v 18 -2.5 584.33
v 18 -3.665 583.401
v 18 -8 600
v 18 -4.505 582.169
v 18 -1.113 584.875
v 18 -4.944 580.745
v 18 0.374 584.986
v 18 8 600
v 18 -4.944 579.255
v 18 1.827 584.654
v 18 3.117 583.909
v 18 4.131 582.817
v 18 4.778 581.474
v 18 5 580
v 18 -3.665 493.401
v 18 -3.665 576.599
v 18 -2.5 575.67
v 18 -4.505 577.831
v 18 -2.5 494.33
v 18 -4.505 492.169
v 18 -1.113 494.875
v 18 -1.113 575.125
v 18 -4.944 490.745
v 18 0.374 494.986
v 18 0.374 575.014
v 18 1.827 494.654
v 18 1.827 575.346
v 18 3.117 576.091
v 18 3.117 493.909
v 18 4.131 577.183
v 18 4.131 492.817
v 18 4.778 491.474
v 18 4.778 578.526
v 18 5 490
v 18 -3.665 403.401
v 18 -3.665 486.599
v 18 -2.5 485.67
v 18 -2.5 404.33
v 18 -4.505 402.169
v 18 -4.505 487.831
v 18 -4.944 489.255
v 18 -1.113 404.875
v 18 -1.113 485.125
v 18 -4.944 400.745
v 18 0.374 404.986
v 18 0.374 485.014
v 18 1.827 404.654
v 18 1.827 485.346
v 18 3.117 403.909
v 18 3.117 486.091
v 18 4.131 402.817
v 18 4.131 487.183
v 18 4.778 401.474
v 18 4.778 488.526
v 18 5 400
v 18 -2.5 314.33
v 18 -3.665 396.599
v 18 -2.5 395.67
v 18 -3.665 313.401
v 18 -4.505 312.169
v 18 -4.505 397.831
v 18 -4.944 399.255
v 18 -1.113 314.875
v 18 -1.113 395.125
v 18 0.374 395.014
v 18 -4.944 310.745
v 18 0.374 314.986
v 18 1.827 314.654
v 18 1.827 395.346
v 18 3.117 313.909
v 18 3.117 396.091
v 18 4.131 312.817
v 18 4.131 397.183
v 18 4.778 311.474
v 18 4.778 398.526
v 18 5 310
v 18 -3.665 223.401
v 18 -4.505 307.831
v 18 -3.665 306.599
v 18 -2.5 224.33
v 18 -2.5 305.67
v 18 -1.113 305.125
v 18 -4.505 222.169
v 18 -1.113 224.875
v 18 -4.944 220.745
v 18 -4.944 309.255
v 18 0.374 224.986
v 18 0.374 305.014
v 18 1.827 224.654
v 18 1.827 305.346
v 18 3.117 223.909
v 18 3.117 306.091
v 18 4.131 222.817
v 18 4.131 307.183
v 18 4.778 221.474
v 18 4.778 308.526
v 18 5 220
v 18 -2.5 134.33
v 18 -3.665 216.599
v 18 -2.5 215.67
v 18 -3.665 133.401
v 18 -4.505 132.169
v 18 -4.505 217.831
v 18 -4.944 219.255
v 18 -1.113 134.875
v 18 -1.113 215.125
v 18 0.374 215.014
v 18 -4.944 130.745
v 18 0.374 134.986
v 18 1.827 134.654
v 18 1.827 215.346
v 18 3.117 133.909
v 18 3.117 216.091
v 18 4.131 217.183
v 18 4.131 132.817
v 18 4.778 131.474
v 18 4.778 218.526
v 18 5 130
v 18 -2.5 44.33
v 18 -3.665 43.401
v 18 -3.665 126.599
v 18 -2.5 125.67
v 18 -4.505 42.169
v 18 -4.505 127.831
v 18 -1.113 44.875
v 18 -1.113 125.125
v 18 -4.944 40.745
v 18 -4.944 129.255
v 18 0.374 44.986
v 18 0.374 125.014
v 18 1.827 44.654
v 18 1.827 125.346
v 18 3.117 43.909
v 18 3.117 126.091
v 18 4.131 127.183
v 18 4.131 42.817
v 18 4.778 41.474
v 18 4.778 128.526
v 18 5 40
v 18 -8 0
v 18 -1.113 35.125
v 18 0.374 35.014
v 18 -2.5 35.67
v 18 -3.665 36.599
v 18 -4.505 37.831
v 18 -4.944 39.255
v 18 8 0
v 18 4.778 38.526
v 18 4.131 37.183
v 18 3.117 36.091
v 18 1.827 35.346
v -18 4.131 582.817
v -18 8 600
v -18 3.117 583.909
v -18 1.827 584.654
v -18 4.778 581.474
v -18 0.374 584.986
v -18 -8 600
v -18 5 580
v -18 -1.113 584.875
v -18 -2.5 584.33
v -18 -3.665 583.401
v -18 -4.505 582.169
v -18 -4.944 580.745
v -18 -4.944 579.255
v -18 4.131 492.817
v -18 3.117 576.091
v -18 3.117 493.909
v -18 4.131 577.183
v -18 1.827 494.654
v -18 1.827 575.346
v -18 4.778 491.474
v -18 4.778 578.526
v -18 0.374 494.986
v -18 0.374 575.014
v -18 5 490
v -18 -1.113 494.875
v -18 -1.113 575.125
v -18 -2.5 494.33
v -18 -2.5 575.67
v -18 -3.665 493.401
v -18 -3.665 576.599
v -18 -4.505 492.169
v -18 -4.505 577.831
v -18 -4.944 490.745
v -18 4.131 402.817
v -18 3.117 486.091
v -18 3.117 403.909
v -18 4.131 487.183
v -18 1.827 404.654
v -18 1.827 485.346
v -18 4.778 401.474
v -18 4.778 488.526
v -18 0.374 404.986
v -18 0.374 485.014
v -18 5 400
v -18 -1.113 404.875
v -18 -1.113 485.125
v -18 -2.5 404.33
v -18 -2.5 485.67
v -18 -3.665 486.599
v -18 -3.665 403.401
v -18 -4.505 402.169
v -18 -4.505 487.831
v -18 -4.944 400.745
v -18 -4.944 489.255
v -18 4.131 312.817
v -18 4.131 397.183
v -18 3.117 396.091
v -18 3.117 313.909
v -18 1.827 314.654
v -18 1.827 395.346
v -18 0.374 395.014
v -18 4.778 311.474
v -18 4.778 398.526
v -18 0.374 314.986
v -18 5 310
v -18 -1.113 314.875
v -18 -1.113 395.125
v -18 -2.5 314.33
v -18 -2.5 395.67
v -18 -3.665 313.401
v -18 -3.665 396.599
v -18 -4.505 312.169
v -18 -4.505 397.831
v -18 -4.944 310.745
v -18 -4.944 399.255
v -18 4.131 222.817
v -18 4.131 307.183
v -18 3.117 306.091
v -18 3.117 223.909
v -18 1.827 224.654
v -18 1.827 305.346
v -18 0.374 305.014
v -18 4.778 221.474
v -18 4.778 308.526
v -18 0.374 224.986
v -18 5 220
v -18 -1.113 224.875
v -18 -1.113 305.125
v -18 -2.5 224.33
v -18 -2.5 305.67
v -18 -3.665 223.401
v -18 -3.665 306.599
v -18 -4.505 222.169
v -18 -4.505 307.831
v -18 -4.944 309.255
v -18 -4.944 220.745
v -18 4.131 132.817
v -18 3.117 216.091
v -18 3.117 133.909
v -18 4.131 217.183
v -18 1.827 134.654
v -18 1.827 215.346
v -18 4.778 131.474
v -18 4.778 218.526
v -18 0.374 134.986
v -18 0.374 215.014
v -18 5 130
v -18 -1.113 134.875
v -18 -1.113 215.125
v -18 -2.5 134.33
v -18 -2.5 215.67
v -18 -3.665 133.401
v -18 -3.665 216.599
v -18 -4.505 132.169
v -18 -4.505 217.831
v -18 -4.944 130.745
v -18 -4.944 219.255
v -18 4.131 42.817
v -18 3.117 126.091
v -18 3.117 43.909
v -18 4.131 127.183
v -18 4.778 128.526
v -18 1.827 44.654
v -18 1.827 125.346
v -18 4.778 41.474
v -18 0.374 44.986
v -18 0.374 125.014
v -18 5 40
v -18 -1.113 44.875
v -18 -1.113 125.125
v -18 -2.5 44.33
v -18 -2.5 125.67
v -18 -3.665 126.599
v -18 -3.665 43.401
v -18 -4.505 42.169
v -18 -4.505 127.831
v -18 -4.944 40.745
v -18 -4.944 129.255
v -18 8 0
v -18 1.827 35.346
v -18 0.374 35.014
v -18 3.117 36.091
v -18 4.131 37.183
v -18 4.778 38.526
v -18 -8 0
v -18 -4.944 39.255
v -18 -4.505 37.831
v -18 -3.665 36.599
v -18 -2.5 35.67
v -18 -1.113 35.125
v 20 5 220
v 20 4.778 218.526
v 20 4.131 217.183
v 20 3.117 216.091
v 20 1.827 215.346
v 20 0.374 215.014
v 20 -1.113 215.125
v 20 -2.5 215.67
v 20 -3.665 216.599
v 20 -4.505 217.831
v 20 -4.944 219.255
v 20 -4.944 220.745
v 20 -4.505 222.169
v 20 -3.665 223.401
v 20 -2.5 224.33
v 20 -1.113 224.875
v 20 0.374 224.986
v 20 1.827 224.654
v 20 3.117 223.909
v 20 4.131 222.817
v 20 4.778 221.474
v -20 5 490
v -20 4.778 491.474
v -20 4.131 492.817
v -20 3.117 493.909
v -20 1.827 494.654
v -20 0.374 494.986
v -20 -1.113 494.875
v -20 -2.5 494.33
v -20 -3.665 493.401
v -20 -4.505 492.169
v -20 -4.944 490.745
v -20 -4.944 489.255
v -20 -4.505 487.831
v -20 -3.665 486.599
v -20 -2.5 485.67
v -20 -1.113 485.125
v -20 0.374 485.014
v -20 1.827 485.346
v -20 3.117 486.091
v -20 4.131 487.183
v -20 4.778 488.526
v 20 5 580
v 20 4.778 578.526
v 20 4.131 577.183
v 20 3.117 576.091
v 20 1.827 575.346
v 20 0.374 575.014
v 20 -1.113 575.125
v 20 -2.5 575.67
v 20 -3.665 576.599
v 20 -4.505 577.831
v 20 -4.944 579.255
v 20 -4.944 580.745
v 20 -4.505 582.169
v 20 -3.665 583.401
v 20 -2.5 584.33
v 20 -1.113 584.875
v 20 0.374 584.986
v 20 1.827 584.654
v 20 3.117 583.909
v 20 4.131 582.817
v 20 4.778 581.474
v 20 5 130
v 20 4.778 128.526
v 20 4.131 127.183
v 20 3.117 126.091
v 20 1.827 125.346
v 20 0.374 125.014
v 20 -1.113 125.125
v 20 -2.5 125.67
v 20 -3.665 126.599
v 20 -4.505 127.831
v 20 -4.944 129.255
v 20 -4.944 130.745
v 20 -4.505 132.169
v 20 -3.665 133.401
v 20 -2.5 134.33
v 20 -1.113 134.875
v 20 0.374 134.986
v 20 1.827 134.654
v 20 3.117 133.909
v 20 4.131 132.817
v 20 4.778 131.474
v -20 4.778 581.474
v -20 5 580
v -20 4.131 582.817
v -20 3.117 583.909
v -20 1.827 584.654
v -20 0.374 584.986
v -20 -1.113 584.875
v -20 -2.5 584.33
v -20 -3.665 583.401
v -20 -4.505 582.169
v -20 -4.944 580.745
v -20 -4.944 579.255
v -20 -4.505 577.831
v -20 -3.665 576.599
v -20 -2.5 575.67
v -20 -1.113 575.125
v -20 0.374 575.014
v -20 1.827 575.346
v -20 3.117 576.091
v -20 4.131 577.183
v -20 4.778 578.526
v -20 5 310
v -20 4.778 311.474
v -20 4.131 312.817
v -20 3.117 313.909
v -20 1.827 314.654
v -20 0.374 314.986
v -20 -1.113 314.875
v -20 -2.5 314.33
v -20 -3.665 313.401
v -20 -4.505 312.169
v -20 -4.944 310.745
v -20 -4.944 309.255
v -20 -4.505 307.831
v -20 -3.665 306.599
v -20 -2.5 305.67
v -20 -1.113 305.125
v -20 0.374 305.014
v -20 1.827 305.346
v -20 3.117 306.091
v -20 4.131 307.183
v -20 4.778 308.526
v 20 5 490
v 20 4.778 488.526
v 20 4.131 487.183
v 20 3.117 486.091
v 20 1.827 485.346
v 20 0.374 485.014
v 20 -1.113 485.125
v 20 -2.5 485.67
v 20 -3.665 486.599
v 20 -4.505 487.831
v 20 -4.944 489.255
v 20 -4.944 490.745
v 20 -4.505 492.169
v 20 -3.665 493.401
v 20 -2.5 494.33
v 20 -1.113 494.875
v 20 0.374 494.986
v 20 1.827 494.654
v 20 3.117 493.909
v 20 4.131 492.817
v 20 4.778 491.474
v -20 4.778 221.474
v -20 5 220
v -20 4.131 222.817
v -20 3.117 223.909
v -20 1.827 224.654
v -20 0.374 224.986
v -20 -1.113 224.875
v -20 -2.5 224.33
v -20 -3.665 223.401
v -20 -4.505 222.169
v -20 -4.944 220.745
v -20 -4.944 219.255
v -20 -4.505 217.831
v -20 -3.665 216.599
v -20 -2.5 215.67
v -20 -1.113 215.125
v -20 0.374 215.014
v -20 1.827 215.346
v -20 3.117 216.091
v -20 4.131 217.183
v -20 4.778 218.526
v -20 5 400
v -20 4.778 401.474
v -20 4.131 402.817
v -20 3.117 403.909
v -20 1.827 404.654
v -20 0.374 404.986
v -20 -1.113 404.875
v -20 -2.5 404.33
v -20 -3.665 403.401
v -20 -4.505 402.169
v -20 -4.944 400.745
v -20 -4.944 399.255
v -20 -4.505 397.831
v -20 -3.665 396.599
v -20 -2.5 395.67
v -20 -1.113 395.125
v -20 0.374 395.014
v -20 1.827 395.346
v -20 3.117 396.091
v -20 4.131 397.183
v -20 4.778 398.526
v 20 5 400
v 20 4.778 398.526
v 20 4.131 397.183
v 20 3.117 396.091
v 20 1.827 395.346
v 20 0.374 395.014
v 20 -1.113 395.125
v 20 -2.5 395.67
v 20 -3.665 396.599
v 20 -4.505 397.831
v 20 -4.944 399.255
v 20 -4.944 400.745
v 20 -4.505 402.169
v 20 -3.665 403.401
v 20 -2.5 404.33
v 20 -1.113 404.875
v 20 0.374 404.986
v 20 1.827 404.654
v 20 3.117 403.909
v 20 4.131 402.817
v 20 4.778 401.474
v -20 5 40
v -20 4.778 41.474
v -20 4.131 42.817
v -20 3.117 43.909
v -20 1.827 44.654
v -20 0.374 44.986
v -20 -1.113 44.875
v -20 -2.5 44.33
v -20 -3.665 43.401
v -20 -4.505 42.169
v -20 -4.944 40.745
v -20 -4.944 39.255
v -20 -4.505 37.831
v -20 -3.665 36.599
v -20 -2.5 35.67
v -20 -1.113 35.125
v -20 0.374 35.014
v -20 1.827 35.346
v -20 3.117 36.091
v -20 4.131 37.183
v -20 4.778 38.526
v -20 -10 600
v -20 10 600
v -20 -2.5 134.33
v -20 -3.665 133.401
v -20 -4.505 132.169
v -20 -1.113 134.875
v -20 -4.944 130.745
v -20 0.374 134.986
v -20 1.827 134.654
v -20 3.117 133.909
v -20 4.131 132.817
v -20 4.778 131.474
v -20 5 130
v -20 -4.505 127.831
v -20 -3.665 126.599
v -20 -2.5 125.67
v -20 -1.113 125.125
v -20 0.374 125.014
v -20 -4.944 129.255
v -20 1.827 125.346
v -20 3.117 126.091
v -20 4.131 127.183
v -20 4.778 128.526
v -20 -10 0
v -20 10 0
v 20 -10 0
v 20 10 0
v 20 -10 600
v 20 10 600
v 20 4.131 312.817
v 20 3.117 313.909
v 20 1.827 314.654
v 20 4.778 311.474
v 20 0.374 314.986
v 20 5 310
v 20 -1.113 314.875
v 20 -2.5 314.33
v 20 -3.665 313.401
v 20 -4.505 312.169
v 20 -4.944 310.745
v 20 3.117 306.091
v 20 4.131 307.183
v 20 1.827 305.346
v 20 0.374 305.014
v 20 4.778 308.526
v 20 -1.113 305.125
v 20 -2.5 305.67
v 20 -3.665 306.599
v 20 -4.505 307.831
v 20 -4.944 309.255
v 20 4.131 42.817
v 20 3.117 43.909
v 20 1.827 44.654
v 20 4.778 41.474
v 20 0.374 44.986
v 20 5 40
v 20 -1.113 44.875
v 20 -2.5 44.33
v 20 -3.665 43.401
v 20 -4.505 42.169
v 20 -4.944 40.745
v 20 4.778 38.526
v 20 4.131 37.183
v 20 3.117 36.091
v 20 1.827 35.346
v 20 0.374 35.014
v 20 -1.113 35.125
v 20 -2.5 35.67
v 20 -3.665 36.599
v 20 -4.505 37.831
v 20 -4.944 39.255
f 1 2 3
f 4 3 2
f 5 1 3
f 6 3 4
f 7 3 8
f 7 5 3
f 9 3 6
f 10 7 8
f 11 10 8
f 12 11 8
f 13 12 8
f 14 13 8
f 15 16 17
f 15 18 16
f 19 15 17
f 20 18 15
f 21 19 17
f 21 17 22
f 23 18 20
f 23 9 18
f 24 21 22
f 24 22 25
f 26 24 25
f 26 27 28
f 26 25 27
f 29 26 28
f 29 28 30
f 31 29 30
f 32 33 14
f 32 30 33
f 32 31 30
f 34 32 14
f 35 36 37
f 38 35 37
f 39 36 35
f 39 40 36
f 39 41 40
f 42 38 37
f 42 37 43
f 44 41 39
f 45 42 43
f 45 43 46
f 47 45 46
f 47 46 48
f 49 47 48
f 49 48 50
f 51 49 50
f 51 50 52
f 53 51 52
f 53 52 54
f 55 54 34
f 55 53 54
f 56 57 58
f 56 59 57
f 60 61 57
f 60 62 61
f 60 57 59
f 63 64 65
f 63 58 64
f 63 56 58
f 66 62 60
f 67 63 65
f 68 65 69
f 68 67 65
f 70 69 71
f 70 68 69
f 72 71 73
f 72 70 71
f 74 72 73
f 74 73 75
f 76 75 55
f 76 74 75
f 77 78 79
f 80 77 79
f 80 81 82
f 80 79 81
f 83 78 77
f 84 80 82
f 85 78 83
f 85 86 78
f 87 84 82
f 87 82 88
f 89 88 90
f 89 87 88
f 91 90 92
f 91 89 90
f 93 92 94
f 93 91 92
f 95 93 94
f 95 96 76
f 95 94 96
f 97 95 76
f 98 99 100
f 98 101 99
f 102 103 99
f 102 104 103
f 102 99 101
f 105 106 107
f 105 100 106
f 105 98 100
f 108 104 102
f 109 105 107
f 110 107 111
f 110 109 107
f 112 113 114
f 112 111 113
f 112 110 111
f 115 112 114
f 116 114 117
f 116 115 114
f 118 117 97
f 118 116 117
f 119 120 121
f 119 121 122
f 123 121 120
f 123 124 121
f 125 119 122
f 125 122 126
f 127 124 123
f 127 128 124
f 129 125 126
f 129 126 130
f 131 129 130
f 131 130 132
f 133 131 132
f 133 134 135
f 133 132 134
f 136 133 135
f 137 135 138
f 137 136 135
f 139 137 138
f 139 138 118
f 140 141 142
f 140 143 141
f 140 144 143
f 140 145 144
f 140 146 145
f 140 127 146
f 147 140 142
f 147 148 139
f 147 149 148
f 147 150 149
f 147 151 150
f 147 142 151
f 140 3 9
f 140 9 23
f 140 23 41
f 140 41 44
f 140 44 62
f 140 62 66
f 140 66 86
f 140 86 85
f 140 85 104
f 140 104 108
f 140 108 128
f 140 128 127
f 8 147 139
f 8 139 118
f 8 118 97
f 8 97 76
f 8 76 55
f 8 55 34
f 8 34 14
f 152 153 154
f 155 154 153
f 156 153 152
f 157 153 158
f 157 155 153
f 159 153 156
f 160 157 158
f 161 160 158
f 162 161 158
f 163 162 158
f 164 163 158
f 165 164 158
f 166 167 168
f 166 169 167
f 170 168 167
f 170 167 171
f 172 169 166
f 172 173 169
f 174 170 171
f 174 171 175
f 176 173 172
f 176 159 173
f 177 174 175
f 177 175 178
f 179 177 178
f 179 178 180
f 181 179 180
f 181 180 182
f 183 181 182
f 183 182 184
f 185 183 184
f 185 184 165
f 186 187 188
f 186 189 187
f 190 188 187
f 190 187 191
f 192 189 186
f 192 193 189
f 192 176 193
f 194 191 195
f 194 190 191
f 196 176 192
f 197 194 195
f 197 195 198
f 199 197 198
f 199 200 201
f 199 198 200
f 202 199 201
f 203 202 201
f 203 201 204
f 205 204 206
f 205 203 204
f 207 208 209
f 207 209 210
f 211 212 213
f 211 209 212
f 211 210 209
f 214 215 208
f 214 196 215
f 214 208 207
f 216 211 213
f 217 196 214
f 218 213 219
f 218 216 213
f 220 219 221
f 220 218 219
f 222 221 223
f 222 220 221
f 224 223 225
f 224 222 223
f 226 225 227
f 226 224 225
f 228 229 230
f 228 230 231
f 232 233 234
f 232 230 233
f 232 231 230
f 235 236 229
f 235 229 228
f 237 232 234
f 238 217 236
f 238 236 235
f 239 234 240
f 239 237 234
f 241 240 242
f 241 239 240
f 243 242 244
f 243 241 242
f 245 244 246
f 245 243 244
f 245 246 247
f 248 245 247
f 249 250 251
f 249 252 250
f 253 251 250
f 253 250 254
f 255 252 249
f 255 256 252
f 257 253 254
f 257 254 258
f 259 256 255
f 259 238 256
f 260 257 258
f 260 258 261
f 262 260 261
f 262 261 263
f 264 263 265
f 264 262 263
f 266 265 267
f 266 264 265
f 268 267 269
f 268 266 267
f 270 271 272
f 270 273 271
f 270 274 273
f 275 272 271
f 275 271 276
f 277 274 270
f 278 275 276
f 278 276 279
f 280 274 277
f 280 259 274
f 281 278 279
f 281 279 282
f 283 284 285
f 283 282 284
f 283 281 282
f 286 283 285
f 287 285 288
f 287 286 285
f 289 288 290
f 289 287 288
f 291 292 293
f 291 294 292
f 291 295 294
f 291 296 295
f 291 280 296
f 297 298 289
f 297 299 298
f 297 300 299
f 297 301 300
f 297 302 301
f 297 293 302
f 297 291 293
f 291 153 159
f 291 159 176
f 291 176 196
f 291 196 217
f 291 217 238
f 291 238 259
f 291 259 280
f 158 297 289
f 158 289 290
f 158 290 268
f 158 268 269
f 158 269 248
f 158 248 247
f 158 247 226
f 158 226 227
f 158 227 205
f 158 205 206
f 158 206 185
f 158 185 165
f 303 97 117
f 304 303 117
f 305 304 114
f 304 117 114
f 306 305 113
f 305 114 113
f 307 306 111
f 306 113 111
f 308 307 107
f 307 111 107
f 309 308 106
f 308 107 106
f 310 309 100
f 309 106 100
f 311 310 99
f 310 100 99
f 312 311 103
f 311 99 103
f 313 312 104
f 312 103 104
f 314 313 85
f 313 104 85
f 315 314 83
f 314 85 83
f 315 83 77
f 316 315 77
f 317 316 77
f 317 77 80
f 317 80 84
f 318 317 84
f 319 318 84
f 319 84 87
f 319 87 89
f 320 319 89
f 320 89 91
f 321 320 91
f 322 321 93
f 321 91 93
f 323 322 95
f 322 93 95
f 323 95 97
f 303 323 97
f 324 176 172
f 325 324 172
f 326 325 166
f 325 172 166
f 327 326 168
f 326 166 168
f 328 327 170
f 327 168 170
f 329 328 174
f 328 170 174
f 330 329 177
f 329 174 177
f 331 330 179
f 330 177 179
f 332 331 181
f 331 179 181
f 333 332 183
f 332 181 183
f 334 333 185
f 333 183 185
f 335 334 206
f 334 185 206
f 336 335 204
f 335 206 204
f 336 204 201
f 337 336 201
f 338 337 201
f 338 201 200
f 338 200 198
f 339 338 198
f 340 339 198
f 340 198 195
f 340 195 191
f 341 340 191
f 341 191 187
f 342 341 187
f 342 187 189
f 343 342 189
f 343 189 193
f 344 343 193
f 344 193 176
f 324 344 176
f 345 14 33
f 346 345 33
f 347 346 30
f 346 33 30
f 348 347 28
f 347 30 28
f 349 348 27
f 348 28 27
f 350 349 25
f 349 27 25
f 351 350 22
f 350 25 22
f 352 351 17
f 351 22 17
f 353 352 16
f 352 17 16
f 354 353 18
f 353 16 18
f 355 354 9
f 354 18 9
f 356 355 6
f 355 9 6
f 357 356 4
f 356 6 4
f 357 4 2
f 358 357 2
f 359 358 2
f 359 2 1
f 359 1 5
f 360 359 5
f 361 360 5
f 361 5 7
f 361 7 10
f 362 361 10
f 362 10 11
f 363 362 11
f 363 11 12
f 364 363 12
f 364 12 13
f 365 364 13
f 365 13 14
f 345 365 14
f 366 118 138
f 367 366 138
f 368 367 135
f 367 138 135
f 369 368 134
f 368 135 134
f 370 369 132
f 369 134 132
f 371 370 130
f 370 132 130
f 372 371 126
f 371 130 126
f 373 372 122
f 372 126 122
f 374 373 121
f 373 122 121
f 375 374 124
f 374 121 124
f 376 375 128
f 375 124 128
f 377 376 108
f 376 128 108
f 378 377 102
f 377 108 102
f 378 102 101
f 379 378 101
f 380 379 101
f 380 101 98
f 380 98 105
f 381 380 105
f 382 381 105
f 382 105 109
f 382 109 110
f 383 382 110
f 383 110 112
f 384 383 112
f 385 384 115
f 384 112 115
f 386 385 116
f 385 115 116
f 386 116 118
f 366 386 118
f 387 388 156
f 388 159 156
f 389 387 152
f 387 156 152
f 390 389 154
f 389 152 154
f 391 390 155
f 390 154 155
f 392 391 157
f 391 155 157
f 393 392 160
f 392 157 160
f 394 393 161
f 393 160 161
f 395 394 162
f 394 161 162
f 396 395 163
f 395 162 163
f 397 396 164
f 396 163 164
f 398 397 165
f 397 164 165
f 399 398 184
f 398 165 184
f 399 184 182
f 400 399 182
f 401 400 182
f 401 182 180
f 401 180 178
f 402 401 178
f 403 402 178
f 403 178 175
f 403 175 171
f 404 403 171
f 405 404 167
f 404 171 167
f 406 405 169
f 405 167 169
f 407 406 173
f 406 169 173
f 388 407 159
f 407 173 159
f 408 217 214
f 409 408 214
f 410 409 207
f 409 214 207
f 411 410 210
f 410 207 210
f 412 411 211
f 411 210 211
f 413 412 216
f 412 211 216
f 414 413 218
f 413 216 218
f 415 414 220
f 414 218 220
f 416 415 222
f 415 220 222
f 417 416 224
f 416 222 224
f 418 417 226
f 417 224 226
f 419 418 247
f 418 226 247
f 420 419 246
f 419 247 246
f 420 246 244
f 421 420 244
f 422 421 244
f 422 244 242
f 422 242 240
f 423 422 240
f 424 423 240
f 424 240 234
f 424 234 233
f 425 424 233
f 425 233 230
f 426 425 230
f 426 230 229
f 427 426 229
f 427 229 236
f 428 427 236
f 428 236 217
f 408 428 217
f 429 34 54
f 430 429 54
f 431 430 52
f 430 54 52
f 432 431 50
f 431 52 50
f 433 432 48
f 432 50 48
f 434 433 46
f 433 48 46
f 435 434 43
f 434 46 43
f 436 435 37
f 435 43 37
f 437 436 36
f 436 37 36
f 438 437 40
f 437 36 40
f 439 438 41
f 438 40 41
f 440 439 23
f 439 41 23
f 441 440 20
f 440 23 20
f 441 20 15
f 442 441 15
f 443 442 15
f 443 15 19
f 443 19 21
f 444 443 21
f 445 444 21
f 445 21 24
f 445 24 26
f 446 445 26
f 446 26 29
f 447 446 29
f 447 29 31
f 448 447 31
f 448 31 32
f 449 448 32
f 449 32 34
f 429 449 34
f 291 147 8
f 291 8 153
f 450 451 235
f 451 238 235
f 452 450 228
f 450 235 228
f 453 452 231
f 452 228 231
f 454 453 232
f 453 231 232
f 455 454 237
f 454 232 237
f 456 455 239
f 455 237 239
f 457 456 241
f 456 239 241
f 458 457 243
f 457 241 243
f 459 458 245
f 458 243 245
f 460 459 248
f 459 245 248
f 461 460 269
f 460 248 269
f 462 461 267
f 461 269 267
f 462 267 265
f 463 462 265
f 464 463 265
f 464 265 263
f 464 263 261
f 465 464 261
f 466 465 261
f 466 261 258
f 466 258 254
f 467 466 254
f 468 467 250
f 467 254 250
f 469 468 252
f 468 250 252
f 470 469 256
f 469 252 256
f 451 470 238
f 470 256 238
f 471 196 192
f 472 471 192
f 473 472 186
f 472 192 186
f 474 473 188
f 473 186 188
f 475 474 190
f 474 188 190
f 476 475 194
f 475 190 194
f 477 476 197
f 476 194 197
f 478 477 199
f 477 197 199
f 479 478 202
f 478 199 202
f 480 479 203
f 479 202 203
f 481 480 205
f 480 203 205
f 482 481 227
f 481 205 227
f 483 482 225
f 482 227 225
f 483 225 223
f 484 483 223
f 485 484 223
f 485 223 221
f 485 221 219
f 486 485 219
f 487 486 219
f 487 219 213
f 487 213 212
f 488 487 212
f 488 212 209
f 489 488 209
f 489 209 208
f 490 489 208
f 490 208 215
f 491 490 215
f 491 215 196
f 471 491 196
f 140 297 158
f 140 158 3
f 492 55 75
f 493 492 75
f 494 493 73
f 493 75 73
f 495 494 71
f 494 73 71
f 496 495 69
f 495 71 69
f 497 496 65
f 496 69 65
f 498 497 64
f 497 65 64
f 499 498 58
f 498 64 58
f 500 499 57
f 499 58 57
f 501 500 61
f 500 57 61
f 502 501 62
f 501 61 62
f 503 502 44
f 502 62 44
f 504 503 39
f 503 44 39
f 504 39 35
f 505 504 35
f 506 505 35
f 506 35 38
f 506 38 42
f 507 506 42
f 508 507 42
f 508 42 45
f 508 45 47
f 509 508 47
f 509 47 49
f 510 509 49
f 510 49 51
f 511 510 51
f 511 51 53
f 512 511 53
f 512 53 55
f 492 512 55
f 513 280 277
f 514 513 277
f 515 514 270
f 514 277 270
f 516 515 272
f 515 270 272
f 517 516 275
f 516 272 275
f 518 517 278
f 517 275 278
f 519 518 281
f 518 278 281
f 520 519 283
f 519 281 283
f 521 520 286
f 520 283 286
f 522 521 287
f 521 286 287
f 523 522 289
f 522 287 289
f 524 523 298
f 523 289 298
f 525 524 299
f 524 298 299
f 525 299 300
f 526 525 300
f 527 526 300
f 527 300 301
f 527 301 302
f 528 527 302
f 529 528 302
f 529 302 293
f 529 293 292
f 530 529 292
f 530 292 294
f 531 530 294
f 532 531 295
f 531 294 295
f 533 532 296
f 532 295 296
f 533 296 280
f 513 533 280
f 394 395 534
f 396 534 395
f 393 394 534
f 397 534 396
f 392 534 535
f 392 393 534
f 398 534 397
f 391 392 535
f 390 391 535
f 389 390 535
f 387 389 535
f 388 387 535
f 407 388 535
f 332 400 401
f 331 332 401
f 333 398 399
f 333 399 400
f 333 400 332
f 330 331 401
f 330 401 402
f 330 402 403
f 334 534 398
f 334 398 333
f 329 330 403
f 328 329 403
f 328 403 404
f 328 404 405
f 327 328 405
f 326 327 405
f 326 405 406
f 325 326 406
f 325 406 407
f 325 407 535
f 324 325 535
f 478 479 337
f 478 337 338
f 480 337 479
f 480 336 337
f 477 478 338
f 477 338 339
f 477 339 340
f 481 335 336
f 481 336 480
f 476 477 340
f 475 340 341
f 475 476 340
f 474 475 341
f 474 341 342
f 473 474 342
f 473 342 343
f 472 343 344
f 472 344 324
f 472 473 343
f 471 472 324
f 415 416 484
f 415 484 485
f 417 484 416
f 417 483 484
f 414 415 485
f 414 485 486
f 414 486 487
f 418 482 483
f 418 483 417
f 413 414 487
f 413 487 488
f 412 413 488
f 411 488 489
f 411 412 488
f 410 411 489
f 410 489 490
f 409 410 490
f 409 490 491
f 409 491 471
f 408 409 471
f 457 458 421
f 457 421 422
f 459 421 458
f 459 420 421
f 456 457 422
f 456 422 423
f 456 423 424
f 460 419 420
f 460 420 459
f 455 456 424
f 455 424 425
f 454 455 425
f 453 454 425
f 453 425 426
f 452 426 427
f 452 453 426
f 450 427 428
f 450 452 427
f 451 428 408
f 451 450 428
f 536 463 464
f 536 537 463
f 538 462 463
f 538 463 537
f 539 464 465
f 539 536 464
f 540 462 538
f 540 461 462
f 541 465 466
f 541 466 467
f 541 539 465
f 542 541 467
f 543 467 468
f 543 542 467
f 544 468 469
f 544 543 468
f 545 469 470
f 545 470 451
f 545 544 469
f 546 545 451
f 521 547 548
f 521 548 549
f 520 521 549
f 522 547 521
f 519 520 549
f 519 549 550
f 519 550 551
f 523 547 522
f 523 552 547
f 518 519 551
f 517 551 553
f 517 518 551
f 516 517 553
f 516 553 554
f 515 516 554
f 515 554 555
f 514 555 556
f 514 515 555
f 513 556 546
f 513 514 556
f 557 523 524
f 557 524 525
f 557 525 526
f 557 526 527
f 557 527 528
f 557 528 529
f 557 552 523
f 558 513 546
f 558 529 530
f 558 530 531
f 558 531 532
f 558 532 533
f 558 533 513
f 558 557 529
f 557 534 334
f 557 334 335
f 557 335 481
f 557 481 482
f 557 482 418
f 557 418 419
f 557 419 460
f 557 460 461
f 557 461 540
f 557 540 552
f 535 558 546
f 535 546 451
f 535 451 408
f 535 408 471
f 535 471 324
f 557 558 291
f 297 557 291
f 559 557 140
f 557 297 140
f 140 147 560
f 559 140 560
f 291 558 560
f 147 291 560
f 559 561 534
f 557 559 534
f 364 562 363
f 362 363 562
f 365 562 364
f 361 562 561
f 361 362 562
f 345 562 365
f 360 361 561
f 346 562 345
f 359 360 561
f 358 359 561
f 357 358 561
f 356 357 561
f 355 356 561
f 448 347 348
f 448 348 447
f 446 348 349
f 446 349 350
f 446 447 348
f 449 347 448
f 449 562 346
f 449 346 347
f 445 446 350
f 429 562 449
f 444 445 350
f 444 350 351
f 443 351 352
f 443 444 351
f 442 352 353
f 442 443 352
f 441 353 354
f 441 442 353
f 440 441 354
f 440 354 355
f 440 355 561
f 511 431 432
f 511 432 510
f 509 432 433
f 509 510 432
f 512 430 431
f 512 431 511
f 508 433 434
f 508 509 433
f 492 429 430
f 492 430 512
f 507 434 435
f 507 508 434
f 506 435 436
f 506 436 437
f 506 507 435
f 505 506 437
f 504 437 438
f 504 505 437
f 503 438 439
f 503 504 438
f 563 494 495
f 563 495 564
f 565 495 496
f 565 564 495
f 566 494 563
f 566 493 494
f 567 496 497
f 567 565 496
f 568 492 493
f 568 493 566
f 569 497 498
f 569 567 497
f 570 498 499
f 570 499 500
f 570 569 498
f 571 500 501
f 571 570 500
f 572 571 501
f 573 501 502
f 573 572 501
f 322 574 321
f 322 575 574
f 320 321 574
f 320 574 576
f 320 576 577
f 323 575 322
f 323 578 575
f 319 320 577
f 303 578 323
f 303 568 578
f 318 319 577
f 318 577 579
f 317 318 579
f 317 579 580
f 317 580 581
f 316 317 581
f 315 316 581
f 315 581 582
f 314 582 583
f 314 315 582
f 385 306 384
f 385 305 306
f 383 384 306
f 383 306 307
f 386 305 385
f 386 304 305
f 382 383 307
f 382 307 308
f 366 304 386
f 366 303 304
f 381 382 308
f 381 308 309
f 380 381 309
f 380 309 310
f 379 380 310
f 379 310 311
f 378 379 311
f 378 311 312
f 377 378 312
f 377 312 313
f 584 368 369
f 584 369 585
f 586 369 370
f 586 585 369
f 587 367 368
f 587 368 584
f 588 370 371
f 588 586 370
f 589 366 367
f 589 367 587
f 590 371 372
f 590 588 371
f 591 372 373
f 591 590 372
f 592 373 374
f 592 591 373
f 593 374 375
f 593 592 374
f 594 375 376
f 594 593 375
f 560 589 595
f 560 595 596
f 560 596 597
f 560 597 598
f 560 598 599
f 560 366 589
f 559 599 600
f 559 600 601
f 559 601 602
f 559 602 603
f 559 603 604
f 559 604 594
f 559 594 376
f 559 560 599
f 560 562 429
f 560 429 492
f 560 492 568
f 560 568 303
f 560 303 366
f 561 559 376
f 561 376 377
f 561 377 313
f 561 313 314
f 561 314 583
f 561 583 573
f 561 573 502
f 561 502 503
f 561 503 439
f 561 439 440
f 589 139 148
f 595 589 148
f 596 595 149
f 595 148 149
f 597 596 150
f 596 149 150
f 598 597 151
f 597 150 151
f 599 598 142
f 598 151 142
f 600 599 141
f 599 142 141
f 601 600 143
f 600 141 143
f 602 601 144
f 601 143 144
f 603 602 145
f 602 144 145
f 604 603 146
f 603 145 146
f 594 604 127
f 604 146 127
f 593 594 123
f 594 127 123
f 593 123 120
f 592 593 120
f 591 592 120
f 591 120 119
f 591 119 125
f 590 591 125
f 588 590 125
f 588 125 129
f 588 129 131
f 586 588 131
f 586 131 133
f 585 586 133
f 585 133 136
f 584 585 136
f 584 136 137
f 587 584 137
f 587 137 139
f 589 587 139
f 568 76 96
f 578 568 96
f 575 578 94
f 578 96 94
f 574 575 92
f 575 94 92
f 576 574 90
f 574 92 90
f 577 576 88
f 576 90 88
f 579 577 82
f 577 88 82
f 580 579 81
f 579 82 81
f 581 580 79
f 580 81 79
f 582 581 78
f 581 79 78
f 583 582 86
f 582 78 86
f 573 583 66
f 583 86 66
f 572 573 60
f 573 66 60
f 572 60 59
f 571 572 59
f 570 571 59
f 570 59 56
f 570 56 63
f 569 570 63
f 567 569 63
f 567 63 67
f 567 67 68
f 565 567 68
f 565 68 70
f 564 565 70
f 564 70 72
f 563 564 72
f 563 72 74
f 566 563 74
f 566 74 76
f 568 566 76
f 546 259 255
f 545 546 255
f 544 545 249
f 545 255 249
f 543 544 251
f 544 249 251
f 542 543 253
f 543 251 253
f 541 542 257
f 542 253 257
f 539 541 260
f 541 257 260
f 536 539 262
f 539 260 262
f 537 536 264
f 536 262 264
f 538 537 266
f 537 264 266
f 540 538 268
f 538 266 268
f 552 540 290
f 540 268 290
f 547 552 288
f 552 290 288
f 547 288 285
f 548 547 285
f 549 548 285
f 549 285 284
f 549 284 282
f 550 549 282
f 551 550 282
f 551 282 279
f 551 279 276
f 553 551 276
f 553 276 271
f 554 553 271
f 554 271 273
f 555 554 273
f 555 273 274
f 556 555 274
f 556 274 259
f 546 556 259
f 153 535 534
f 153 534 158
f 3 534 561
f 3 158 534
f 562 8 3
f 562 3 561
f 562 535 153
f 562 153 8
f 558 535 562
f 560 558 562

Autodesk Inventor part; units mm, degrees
ref_plane "YZ Plane" through (0, 0, 0) normal (1, 0, 0) x (0, 1, 0)
ref_plane "XZ Plane" through (0, 0, 0) normal (0, 1, 0) x (-1, 0, 0)
ref_plane "XY Plane" through (0, 0, 0) normal (0, 0, 1) x (1, 0, 0)
sketch "Sketch1" plane through (0, 0, 0) normal (0, 0, 1) x (1, 0, 0)
  line L0 (-20, 10) -> (20, 10)
  line L1 (20, 10) -> (20, -10)
  line L2 (20, -10) -> (-20, -10)
  line L3 (-20, -10) -> (-20, 10)
  line L4 (-20, 10) -> (20, -10) construction
  line L5 (18, 8) -> (-18, 8)
  line L6 (-18, 8) -> (-18, -8)
  line L7 (-18, -8) -> (18, -8)
  line L8 (18, -8) -> (18, 8)
  point P0 (0, 0)
  point P1 (0, 0)
  dimension "d0" = 40
  dimension "d1" = 20
  dimension "d4" = 2
extrude "Extrusion1" add sketch "Sketch1" along normal blind 600
sketch "Sketch2" plane through (0, 0, 0) normal (1, 0, 0) x (0, 1, 0)
  line L0 (-10, 0) -> (10, 0) projected
  line L1 (10, 0) -> (10, 600) construction
  line L2 (-10, 600) -> (10, 600) projected
  line L3 (-10, 0) -> (-10, 600) construction
  circle A0 centre (0, 580) radius 5
  point P0 (0, 0)
  point P1 (0, 600)
  dimension "d5" = 10
  dimension "d6" = 20
extrude "Extrusion2" cut sketch "Sketch2" along normal through all both and the other way through all
pattern_linear "Rectangular Pattern1" count 7 spacing 90 along (0, 0, -1) of "Extrusion2"
properties part number "Wash way double"
